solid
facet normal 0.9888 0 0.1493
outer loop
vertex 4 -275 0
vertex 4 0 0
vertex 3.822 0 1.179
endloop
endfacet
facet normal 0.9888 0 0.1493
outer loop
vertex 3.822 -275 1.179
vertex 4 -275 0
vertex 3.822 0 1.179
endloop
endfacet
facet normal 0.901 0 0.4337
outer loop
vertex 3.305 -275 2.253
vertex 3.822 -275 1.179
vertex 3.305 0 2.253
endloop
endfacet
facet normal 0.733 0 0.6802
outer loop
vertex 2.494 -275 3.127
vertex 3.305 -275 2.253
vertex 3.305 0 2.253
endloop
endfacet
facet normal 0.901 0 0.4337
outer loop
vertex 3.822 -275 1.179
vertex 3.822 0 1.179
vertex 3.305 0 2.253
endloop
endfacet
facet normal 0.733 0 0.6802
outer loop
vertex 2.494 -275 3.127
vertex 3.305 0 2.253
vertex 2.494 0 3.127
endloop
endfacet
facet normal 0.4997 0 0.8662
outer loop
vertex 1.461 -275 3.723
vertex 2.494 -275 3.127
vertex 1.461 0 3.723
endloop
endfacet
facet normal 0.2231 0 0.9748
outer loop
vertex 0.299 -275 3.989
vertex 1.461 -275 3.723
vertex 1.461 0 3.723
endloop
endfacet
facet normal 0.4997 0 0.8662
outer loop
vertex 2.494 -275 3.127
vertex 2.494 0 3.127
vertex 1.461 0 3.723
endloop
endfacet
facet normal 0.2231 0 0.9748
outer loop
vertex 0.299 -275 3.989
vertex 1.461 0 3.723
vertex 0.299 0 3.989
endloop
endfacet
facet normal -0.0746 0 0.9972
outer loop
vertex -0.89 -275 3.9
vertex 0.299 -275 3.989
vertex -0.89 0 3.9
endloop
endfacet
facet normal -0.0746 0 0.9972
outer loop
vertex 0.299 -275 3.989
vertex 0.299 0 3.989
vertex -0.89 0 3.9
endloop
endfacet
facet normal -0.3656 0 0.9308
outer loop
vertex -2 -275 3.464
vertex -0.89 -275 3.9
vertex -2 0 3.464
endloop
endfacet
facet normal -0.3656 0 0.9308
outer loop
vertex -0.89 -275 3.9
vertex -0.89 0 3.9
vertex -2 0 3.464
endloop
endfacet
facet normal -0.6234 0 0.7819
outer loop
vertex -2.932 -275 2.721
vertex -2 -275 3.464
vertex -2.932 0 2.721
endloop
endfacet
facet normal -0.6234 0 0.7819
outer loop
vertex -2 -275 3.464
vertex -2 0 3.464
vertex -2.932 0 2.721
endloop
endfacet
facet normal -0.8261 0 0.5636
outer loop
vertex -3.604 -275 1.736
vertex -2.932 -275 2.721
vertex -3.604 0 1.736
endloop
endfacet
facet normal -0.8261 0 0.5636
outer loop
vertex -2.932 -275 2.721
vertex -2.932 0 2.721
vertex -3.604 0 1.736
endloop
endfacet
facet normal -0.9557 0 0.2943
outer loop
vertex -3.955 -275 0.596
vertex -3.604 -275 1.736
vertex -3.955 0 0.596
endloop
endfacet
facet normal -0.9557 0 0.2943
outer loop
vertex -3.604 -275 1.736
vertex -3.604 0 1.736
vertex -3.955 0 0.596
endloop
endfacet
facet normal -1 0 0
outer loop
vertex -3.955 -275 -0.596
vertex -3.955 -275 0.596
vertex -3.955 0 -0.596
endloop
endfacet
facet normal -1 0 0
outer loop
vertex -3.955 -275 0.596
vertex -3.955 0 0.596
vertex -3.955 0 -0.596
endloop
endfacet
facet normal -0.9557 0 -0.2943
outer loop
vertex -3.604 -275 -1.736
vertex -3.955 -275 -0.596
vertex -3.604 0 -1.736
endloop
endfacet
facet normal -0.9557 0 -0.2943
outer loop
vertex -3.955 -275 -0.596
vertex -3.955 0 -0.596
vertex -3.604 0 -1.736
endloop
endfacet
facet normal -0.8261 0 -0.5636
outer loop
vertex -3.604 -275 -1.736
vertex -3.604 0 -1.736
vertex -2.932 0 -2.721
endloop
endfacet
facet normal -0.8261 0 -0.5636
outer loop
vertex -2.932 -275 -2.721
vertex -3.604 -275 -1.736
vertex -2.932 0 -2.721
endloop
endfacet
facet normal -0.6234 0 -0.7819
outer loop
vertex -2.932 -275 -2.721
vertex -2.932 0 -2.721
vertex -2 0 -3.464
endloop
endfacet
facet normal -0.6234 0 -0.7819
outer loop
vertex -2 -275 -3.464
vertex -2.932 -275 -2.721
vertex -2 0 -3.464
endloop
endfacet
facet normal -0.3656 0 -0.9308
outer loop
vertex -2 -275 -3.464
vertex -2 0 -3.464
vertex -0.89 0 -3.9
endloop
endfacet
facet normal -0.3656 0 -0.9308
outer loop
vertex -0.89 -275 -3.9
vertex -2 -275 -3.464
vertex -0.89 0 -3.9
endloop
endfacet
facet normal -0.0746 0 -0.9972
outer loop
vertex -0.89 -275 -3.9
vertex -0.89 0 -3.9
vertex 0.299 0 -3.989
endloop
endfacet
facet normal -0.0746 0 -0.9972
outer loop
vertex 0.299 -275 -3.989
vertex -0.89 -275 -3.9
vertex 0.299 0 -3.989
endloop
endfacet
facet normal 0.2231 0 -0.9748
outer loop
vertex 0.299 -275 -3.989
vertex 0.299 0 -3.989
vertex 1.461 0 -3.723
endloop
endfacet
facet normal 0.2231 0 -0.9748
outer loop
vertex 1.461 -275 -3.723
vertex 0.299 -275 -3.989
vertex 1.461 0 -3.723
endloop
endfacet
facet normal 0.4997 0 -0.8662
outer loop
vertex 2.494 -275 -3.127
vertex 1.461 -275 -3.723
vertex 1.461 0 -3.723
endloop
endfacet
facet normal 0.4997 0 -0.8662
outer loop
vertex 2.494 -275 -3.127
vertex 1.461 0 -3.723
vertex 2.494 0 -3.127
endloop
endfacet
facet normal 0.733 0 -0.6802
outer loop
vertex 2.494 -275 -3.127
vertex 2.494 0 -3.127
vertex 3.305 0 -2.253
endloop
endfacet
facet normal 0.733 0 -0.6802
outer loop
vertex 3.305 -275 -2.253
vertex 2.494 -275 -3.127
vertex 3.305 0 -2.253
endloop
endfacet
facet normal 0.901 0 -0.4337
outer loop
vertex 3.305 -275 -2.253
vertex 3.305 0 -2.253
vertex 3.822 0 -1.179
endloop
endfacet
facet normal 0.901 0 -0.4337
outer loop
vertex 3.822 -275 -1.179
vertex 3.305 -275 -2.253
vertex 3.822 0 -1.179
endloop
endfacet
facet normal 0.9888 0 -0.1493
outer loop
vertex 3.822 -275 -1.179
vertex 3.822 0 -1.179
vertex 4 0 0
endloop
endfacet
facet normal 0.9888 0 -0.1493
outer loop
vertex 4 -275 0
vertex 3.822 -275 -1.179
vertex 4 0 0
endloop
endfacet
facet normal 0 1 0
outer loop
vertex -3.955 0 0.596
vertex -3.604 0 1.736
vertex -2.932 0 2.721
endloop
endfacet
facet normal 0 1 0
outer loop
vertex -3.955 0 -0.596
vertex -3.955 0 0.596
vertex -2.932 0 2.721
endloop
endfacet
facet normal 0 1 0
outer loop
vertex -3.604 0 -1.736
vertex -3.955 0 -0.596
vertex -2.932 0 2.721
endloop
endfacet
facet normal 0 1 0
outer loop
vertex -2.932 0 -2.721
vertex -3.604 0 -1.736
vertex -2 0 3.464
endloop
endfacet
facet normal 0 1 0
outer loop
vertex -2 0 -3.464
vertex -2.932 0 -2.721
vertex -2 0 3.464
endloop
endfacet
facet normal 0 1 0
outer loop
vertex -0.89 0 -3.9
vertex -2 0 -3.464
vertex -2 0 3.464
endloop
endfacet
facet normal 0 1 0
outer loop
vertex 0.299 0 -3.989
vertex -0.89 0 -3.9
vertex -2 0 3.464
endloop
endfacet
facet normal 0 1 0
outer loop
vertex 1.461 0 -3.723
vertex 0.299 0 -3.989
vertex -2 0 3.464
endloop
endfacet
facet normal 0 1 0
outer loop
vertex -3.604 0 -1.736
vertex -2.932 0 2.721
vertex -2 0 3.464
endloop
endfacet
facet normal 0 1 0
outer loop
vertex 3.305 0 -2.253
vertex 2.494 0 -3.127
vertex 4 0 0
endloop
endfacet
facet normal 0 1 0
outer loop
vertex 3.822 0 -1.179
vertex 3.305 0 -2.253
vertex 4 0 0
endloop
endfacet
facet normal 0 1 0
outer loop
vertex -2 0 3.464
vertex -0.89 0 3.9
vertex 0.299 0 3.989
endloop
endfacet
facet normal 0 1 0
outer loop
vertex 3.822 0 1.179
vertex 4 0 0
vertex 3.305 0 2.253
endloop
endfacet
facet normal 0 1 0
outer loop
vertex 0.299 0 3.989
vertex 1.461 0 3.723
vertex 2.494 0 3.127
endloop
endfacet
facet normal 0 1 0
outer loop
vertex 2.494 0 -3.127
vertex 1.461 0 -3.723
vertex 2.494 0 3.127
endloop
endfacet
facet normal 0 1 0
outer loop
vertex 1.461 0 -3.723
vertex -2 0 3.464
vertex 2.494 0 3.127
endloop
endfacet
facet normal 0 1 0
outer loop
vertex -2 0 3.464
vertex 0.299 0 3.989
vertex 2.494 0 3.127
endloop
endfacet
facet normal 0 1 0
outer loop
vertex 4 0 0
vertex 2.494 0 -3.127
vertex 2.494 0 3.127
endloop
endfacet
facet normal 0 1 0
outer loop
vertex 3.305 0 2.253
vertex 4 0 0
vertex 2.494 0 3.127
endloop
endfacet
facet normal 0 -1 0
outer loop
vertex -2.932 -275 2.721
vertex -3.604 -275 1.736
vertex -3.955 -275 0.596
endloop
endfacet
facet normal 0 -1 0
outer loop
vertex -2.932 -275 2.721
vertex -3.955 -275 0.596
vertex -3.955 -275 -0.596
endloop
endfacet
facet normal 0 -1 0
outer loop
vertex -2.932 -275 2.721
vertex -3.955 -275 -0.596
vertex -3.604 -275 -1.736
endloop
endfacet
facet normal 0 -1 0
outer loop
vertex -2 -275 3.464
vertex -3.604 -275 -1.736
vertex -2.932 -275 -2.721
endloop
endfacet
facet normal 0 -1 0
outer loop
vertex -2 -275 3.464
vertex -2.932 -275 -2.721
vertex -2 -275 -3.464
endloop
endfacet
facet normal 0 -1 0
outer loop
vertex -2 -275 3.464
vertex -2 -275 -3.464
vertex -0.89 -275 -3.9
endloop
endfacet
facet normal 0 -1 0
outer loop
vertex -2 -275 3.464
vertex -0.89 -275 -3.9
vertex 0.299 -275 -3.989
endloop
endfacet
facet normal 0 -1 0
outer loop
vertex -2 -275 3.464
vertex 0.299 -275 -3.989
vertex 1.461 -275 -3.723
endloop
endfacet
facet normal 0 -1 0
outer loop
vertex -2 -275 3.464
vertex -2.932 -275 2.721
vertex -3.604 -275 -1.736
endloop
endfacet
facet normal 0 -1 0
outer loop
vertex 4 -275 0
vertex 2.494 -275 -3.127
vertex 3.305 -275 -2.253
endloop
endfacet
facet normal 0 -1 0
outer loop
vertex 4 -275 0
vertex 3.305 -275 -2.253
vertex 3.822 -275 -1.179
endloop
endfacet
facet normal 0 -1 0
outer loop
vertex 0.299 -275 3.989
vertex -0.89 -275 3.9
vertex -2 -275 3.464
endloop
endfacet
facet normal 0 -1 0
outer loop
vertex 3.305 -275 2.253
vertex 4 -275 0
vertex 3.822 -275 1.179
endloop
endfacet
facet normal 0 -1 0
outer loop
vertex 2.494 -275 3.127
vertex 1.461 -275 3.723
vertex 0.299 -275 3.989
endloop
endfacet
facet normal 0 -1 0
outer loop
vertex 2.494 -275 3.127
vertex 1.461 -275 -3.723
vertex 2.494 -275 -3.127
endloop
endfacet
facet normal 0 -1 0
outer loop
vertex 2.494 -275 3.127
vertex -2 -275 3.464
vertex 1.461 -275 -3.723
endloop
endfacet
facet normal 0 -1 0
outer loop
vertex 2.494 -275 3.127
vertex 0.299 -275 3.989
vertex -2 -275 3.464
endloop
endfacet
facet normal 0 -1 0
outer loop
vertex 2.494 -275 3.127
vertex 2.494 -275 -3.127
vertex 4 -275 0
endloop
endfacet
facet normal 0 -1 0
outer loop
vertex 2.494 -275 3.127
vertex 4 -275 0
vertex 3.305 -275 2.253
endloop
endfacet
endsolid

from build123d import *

# Parameters (mm, degrees)
F0_R     = 4
F1_DEPTH = 400
F2_DEPTH = 100
F3_DEPTH = 25


with BuildPart() as f1:
    # F0 (on Front) → F1 (new body)
    with BuildSketch(Plane.XZ):
        Circle(F0_R)
    extrude(amount=F1_DEPTH)

    # F2 (cut): a face of the model
    f2_faces = [f1.faces().sort_by_distance(p)[0] for p in [
        (0, -400, 0),
    ]]
    extrude(f2_faces, amount=-F2_DEPTH, mode=Mode.SUBTRACT)

    # F3 (cut): a face of the model
    f3_faces = [f1.faces().sort_by_distance(p)[0] for p in [
        (0, -300, 0),
    ]]
    extrude(f3_faces, amount=-F3_DEPTH, mode=Mode.SUBTRACT)


solid = f1.part
